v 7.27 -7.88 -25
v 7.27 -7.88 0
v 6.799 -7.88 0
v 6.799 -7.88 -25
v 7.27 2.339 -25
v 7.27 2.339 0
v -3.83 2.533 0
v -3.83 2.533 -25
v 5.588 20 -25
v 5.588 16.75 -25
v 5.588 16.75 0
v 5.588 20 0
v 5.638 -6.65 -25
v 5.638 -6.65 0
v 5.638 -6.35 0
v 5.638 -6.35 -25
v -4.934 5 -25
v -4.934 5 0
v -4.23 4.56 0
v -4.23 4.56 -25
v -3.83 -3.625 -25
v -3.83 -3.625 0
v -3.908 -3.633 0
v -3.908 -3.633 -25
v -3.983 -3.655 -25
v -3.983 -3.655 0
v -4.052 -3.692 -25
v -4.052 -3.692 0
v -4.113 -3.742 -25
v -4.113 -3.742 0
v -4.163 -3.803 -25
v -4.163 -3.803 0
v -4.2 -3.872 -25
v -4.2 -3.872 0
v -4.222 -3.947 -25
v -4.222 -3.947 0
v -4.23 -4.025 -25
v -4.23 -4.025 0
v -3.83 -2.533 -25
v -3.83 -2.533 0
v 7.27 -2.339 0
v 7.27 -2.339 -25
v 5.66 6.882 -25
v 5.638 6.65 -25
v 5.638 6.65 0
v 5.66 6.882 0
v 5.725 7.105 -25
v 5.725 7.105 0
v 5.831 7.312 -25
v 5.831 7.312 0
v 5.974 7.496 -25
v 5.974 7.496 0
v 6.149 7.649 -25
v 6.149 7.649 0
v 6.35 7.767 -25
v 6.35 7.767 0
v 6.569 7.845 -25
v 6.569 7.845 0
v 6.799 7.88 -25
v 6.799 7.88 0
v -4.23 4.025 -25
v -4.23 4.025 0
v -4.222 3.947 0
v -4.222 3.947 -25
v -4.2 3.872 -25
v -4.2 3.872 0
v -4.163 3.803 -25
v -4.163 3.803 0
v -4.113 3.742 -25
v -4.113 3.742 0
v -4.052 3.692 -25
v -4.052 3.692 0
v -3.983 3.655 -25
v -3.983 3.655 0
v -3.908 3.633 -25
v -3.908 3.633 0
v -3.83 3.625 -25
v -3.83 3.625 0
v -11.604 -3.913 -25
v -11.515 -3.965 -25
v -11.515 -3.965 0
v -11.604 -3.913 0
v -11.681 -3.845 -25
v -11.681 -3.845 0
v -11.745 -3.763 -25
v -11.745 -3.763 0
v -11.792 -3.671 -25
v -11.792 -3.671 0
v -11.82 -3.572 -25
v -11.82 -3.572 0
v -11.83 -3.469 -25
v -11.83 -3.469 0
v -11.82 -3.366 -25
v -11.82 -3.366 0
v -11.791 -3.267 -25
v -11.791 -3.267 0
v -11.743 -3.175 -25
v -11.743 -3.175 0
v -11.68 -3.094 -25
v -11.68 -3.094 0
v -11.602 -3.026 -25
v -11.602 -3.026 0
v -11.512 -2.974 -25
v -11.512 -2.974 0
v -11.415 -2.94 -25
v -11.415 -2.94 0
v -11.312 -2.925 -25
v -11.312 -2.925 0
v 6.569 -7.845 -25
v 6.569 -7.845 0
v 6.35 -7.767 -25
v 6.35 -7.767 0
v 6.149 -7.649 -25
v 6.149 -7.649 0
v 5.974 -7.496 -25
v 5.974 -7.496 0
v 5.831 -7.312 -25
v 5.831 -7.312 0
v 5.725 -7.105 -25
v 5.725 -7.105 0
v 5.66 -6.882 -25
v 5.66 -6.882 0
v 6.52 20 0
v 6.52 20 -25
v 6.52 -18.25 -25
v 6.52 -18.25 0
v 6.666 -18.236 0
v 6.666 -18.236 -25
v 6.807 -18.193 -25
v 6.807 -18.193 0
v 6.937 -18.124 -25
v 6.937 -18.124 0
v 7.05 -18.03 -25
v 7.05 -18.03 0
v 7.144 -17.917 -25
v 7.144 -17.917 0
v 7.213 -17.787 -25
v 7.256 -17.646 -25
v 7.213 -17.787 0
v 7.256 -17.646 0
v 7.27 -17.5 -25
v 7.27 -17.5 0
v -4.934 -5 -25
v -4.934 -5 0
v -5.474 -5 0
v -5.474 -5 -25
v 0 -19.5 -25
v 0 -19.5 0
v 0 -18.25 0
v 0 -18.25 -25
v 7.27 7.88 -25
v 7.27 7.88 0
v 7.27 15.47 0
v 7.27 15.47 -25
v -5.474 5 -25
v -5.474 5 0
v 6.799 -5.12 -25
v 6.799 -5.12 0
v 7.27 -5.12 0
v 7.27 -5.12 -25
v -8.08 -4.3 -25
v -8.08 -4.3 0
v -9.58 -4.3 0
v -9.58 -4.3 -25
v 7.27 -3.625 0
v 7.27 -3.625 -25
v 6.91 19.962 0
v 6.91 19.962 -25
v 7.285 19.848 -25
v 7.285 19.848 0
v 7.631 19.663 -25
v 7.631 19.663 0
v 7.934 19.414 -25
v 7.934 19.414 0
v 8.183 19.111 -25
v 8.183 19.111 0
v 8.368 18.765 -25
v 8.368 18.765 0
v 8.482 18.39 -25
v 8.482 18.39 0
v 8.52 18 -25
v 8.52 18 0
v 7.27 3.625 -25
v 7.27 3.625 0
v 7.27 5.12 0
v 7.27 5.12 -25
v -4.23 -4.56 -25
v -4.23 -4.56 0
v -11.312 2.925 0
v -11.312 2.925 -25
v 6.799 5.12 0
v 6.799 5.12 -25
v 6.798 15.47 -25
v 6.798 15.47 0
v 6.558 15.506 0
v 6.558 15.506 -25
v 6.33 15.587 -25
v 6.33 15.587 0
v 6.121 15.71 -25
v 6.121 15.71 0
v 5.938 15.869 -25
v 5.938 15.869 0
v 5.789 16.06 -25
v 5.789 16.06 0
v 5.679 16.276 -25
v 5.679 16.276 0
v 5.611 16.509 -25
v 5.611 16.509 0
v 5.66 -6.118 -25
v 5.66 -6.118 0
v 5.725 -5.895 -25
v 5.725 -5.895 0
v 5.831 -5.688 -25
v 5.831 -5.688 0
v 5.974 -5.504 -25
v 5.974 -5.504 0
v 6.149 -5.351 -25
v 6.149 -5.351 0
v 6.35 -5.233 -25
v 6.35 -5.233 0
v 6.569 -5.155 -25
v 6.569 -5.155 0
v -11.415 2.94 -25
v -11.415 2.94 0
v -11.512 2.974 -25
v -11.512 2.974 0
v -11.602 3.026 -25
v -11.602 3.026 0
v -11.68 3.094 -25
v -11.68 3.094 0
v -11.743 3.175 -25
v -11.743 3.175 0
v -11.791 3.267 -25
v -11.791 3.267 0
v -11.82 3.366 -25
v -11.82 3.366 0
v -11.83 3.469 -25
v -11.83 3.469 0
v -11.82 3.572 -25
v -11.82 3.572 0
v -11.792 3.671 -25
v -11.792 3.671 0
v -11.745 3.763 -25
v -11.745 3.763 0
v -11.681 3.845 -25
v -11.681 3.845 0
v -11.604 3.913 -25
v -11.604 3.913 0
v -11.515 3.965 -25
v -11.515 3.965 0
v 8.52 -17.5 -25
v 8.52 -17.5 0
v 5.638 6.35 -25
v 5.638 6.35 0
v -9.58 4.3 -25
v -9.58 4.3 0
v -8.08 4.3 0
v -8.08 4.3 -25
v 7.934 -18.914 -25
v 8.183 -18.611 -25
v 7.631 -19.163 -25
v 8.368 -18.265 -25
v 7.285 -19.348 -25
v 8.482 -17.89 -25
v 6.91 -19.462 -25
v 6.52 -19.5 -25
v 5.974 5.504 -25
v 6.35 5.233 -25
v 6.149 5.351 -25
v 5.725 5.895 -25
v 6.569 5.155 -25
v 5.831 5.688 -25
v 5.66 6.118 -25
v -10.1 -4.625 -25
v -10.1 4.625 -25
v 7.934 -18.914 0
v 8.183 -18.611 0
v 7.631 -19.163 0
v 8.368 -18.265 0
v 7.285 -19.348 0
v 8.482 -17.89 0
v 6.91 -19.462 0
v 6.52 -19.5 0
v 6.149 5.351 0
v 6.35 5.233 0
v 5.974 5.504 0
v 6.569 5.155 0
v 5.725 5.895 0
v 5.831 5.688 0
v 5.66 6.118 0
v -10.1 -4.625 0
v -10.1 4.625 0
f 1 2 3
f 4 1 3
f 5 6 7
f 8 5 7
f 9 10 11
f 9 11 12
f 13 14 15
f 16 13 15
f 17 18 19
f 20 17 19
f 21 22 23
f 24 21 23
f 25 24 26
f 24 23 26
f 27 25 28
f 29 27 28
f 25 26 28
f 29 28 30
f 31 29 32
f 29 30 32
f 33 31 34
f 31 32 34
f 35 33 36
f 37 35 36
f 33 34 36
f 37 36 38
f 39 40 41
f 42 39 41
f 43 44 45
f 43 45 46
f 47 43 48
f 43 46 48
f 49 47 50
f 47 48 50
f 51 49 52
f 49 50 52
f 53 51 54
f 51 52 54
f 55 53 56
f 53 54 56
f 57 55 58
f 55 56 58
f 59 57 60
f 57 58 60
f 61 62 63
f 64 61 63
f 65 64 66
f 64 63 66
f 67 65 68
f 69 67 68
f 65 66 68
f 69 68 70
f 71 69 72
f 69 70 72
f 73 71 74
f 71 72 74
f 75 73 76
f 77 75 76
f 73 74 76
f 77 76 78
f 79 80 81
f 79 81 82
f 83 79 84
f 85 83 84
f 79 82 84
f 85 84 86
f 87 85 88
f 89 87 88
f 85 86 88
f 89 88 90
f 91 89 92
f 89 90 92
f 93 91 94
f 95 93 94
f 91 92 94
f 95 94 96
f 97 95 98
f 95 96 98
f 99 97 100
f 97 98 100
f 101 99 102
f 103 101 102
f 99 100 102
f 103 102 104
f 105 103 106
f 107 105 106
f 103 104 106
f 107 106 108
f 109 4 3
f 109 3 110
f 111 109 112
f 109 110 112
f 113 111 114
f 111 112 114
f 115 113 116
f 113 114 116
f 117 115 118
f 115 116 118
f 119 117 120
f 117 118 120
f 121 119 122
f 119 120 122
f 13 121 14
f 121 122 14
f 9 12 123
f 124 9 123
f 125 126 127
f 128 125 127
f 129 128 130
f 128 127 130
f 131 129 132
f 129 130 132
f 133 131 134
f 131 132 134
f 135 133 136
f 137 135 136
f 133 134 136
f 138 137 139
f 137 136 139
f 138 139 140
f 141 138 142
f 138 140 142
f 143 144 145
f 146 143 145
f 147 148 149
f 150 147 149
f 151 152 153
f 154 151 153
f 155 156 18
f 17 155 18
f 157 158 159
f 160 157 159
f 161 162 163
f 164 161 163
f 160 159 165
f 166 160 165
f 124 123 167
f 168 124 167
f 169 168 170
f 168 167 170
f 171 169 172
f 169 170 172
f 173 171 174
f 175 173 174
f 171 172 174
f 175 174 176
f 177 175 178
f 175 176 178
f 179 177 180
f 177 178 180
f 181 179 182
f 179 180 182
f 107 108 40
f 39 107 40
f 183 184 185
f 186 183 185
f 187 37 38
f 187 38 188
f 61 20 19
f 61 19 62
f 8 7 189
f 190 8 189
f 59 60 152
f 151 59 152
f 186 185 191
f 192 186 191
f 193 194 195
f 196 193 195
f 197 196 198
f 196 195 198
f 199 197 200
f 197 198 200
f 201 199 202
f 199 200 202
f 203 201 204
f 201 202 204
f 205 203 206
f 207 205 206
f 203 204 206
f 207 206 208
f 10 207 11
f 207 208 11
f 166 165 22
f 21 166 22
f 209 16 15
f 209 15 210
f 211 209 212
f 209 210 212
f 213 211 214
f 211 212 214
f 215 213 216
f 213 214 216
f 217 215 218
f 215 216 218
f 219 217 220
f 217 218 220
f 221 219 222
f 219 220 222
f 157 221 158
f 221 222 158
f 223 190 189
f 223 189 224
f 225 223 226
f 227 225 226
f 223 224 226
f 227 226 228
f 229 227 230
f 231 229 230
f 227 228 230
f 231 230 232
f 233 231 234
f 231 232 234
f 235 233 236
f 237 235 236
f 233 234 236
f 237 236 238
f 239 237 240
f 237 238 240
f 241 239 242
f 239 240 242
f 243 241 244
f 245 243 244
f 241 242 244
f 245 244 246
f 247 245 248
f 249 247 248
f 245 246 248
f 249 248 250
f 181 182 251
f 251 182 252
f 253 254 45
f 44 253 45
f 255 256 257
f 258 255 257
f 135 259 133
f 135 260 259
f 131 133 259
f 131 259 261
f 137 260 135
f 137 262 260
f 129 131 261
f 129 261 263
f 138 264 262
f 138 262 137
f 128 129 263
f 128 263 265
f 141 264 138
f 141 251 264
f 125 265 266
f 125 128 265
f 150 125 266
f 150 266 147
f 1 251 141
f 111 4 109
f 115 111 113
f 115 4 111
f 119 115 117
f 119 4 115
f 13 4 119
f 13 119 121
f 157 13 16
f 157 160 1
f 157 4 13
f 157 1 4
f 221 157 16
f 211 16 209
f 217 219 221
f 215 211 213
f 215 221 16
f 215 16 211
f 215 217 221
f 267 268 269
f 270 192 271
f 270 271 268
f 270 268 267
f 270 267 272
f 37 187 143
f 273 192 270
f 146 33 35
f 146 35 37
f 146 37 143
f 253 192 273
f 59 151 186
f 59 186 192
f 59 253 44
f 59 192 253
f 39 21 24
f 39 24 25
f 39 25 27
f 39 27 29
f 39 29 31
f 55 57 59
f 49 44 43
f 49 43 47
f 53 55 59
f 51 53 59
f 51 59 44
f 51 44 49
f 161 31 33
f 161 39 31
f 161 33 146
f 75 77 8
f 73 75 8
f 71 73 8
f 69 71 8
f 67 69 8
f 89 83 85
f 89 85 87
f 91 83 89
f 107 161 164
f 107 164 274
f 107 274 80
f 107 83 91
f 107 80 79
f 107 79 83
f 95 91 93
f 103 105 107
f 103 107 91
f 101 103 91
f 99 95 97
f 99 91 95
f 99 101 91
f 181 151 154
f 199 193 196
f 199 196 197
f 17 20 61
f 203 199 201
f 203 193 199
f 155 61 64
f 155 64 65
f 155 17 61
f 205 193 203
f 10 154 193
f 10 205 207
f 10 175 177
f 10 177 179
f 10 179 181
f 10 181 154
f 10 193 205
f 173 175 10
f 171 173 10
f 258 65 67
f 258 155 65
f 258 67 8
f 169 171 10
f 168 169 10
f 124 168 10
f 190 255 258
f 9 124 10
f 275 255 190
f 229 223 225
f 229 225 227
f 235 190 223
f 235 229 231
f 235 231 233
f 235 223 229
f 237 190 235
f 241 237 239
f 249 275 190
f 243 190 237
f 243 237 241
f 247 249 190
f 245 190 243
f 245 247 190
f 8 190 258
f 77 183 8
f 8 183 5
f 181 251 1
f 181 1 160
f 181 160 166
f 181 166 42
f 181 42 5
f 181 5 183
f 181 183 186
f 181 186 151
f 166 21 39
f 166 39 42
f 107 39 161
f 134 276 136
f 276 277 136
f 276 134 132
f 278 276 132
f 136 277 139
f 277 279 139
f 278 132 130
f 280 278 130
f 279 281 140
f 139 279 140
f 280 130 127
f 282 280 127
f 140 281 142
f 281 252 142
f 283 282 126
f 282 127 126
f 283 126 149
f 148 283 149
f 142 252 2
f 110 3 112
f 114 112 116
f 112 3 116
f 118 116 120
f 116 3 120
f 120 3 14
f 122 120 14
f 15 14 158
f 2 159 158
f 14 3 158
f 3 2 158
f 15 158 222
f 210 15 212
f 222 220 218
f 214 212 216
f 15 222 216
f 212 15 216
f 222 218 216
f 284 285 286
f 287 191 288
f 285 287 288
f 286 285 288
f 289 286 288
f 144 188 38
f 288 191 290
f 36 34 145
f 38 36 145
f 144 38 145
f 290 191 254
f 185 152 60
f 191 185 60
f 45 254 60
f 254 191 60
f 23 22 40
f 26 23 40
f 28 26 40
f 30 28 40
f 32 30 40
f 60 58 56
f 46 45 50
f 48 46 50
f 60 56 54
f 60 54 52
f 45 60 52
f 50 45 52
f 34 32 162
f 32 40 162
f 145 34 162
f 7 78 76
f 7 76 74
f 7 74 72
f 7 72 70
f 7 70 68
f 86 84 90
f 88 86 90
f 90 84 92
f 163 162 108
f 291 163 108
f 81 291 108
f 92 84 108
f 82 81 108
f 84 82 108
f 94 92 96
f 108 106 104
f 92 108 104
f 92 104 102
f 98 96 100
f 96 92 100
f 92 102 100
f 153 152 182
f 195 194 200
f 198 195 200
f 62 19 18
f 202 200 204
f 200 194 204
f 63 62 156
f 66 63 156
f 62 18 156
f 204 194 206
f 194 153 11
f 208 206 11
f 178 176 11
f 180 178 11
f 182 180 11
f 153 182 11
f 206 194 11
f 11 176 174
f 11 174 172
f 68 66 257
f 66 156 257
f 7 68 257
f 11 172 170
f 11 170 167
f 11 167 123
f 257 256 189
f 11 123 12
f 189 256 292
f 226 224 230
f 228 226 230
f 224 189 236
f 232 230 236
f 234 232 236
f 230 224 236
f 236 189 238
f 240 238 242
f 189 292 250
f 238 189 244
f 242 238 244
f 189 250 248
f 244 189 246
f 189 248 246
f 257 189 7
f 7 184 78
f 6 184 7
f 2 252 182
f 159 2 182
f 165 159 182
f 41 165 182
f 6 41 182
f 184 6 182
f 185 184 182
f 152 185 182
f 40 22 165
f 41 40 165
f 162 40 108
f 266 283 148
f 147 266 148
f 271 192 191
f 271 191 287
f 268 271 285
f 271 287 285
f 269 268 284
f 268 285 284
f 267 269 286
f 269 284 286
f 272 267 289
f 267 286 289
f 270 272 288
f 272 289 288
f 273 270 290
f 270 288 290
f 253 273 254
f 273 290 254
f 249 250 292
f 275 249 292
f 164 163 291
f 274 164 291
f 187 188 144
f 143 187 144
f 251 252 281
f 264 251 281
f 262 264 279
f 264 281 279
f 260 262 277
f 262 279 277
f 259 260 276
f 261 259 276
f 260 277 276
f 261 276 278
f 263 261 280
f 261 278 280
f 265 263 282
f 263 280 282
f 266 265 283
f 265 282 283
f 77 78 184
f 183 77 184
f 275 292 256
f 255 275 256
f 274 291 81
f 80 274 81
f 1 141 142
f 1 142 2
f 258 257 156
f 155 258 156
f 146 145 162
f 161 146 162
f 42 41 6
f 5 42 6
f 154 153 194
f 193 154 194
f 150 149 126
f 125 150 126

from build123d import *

# Parameters (mm, degrees)
MAIN_EXTRUSION_DEPTH = 25


with BuildPart() as part:
    # Sk Main Extrusion → Main Extrusion (new body)
    with BuildSketch(Plane.XY):
        with BuildLine():
            Line((-3.83, 2.5328), (-11.31249103, 2.925083334))
            ThreePointArc((-11.31249103, 2.925083334), (-11.819967595, 3.366238681), (-11.514691833, 3.965369062))
            Line((-11.514691833, 3.965369062), (-10.100108722, 4.625))
            Line((-10.100108722, 4.625), (-9.58, 4.3))
            Line((-9.58, 4.3), (-8.08, 4.3))
            Line((-8.08, 4.3), (-5.474147193, 5))
            Line((-5.474147193, 5), (-4.934147193, 5))
            Line((-4.934147193, 5), (-4.23, 4.56))
            Line((-4.23, 4.56), (-4.23, 4.025))
            ThreePointArc((-4.23, 4.025), (-4.112842712, 3.742157288), (-3.83, 3.625))
            Line((-3.83, 3.625), (7.27, 3.625))
            Line((7.27, 3.625), (7.27, 5.120055168))
            Line((7.27, 5.120055168), (6.79886836, 5.120055168))
            ThreePointArc((6.79886836, 5.120055168), (5.9740485, 5.504367154), (5.638, 6.35))
            Line((5.638, 6.35), (5.638, 6.65))
            ThreePointArc((5.638, 6.65), (5.9740485, 7.495632846), (6.79886836, 7.879944832))
            Line((6.79886836, 7.879944832), (7.27, 7.879944832))
            Line((7.27, 7.879944832), (7.27, 15.470020156))
            Line((7.27, 15.470020156), (6.798058361, 15.470020156))
            ThreePointArc((6.798058361, 15.470020156), (5.938401057, 15.86929153), (5.588, 16.75))
            Line((5.588, 16.75), (5.588, 20))
            Line((5.588, 20), (6.52, 20))
            ThreePointArc((6.52, 20), (7.934213562, 19.414213562), (8.52, 18))
            Line((8.52, 18), (8.52, -17.5))
            ThreePointArc((8.52, -17.5), (7.934213562, -18.914213562), (6.52, -19.5))
            Line((6.52, -19.5), (0, -19.5))
            Line((0, -19.5), (0, -18.25))
            Line((0, -18.25), (6.52, -18.25))
            ThreePointArc((6.52, -18.25), (7.050330086, -18.030330086), (7.27, -17.5))
            Line((7.27, -17.5), (7.27, -7.879944832))
            Line((7.27, -7.879944832), (6.79886836, -7.879944832))
            ThreePointArc((6.79886836, -7.879944832), (5.9740485, -7.495632846), (5.638, -6.65))
            Line((5.638, -6.65), (5.638, -6.35))
            ThreePointArc((5.638, -6.35), (5.9740485, -5.504367154), (6.79886836, -5.120055168))
            Line((6.79886836, -5.120055168), (7.27, -5.120055168))
            Line((7.27, -5.120055168), (7.27, -3.625))
            Line((7.27, -3.625), (-3.83, -3.625))
            ThreePointArc((-3.83, -3.625), (-4.112842712, -3.742157288), (-4.23, -4.025))
            Line((-4.23, -4.025), (-4.23, -4.56))
            Line((-4.23, -4.56), (-4.934147193, -5))
            Line((-4.934147193, -5), (-5.474147193, -5))
            Line((-5.474147193, -5), (-8.08, -4.3))
            Line((-8.08, -4.3), (-9.58, -4.3))
            Line((-9.58, -4.3), (-10.100108722, -4.625))
            Line((-10.100108722, -4.625), (-11.514691833, -3.965369062))
            ThreePointArc((-11.514691833, -3.965369062), (-11.819967595, -3.366238681), (-11.31249103, -2.925083334))
            Line((-11.31249103, -2.925083334), (-3.83, -2.5328))
            Line((-3.83, -2.5328), (7.27, -2.339048779))
            Line((7.27, -2.339048779), (7.27, 2.339048779))
            Line((7.27, 2.339048779), (-3.83, 2.5328))
        make_face()
    extrude(amount=-MAIN_EXTRUSION_DEPTH)


solid = part.part
